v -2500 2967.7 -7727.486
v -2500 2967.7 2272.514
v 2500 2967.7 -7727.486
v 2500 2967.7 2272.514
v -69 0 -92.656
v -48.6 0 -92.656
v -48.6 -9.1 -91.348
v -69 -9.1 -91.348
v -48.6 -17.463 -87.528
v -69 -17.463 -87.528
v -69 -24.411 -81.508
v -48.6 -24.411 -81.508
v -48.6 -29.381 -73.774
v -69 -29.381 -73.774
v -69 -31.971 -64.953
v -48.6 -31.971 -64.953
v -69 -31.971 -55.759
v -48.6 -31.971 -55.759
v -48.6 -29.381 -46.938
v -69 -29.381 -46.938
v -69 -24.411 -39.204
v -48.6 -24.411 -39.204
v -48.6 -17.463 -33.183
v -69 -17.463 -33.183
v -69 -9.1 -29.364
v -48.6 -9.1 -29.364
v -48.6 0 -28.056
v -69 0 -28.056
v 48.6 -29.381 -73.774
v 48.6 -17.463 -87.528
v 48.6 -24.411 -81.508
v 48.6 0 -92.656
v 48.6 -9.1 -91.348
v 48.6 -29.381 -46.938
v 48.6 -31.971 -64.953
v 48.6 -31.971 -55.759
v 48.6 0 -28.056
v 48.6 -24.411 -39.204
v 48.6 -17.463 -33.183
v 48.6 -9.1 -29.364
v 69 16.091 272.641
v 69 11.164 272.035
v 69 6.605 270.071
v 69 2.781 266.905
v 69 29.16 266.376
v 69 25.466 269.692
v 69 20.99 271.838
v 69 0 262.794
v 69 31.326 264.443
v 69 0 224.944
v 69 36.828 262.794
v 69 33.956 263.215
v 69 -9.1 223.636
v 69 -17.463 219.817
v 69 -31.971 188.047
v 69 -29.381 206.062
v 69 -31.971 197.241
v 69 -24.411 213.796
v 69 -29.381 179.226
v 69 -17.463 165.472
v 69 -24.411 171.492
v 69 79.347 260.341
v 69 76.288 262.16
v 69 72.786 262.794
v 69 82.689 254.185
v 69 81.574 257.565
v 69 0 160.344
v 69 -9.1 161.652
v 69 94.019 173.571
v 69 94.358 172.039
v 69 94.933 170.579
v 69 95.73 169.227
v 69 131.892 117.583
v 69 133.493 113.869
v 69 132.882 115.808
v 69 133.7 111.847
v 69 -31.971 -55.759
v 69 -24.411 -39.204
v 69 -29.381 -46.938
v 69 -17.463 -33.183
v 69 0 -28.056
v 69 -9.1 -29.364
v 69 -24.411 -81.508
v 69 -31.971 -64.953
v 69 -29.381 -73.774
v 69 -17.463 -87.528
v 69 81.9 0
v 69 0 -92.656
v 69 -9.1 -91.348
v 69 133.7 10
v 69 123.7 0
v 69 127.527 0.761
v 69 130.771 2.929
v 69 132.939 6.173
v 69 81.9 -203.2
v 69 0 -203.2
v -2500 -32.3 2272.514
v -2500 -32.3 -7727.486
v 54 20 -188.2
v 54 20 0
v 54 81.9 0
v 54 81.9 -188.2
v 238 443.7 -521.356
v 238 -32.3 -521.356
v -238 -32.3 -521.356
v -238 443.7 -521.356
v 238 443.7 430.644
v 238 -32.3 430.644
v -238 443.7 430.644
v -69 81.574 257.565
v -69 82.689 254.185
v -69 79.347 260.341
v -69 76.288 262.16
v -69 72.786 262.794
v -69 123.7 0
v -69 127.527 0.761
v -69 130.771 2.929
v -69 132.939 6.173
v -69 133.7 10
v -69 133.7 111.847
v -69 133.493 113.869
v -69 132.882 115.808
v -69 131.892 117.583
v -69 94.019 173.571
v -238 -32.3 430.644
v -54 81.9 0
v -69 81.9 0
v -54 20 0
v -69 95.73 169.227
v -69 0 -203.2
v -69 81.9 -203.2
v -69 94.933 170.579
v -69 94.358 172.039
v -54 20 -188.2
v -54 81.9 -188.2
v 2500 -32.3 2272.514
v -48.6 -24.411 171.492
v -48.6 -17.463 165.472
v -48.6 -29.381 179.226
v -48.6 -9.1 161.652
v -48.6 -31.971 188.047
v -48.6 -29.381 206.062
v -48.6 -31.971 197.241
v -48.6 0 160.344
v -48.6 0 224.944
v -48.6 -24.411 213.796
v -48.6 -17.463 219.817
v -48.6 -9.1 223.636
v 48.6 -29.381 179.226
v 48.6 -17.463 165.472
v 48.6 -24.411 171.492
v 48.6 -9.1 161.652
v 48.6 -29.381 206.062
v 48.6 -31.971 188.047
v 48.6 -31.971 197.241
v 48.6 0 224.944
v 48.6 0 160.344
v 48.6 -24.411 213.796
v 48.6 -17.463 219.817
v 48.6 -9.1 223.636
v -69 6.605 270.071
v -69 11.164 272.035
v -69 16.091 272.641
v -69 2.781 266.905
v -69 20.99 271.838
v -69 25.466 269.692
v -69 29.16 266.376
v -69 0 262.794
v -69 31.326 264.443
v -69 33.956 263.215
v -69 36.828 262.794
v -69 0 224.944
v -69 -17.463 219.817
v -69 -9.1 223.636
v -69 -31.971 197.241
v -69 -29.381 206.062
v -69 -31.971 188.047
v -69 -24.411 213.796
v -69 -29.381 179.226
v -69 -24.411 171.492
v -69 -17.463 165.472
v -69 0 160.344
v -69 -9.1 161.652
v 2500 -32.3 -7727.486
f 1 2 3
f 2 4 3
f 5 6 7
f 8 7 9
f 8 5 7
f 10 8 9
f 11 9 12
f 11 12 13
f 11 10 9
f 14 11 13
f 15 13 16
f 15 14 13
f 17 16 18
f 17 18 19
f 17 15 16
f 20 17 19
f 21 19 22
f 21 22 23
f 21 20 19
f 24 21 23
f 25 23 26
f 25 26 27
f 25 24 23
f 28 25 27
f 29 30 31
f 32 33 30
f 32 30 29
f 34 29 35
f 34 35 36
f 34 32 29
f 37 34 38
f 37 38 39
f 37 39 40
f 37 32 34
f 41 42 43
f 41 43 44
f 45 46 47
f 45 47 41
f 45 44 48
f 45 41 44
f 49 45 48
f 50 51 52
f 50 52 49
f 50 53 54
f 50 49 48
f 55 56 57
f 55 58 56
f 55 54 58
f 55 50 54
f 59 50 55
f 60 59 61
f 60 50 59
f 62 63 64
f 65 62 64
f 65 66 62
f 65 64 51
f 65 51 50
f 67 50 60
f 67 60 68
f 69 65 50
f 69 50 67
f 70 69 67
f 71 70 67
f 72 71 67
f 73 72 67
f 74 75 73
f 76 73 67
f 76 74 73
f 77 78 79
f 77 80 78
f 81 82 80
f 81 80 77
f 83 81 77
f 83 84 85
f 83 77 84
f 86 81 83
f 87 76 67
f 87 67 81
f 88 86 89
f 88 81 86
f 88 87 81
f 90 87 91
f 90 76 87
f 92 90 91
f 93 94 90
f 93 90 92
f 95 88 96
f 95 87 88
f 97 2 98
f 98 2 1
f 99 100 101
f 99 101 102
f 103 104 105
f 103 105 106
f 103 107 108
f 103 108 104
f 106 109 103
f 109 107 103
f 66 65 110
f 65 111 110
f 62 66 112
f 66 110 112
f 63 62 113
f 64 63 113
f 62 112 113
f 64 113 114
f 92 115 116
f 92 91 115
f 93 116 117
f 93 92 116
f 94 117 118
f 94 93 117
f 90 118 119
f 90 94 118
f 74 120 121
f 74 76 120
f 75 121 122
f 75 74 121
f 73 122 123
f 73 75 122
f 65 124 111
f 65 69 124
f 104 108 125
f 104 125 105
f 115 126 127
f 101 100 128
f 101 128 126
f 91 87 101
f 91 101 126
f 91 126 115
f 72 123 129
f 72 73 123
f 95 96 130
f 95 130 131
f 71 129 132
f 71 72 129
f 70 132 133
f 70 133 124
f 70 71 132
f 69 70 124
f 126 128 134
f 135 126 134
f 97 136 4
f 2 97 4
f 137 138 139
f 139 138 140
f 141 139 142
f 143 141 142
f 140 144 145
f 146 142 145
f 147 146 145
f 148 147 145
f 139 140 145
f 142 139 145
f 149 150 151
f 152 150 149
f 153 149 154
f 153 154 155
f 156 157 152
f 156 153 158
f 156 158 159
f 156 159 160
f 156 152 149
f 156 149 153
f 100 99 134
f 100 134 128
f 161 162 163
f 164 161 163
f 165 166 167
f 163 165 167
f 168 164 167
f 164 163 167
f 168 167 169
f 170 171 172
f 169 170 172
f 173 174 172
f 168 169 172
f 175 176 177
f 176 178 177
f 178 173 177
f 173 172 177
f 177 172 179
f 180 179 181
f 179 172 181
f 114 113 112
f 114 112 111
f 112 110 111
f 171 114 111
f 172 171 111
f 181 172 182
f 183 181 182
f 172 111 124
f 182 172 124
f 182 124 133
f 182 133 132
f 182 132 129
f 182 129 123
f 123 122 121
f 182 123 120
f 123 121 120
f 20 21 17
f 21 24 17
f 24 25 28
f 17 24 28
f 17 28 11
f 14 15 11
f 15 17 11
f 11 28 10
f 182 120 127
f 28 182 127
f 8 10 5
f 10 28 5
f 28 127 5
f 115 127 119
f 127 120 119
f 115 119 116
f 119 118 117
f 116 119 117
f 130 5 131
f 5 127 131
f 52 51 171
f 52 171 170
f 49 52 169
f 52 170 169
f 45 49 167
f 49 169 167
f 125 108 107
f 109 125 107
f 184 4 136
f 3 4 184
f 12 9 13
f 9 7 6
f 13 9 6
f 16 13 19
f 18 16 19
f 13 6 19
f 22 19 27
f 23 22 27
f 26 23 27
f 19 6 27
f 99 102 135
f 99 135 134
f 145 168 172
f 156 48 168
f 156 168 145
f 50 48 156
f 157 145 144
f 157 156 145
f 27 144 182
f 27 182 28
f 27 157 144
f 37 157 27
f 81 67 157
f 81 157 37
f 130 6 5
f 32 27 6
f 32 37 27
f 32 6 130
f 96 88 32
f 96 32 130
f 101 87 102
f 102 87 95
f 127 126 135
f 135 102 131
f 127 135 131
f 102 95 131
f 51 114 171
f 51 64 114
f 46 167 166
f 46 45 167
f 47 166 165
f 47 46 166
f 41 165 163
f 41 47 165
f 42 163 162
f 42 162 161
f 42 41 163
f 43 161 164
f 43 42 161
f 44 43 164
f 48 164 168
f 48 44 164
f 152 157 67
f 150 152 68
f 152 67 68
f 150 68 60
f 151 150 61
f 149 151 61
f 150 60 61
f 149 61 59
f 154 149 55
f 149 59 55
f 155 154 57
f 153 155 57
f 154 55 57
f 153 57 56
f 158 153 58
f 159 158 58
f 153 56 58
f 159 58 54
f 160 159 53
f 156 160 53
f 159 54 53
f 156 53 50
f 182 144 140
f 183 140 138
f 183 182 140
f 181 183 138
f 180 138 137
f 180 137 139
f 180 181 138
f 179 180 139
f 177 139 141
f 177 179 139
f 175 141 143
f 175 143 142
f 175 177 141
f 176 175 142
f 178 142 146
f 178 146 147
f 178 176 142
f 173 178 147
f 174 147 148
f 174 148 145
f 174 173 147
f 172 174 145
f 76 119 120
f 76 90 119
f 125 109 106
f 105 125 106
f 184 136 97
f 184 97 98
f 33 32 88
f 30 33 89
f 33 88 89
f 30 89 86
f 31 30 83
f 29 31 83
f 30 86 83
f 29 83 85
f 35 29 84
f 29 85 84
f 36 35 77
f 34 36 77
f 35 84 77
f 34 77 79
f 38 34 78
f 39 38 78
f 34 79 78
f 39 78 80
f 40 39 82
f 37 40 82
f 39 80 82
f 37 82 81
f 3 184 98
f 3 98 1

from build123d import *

# Parameters (mm, degrees)
BOSS_EXTRUDE1_DEPTH = 69
SKETCH4_W           = 15
SKETCH4_H           = 188.2
BOSS_EXTRUDE2_DEPTH = 61.9
BOSS_EXTRUDE3_DEPTH = 20.4
FILLET1_R           = 10
SKETCH6_W           = 10000
SKETCH6_H           = 3000
BOSS_EXTRUDE4_DEPTH = 2500
SKETCH7_W           = 952
SKETCH7_H           = 476
BOSS_EXTRUDE5_DEPTH = 238


with BuildPart() as part:
    # Sketch2 → Boss-Extrude1 (new body, symmetric)
    with BuildSketch(Plane(origin=(0, 0, 0), x_dir=(0, 0, -1), z_dir=(1, 0, 0))):
        with BuildLine():
            Line((-262.793626597, 0), (0, 0))
            Line((0, 0), (203.2, 0))
            Line((203.2, 0), (203.2, 81.9))
            Line((203.2, 81.9), (188.2, 81.9))
            Line((188.2, 81.9), (188.2, 20))
            Line((188.2, 20), (0, 20))
            Line((0, 20), (0, 133.7))
            Line((0, 133.7), (-115, 133.7))
            Line((-115, 133.7), (-171.193830238, 94.352656466))
            Line((-171.193830238, 94.352656466), (-262.793626597, 81.479144628))
            Line((-262.793626597, 81.479144628), (-262.793626597, 31.479144628))
            ThreePointArc((-262.793626597, 31.479144628), (-272.644060375, 15.739572314), (-262.793626597, 0))
        make_face()
    extrude(amount=BOSS_EXTRUDE1_DEPTH, both=True)

    # Sketch4 → Boss-Extrude2 (add)
    with BuildSketch(Plane(origin=(0, 20, 0), x_dir=(1, 0, 0), z_dir=(0, 1, 0))):
        with Locations((61.5, 94.1)):
            Rectangle(SKETCH4_W, SKETCH4_H)
    boss_extrude2 = extrude(amount=BOSS_EXTRUDE2_DEPTH)

    # Mirror1: Boss-Extrude2 across plane
    add(boss_extrude2.mirror(Plane(origin=(0, 0, 0), x_dir=(0, 0, 1), z_dir=(1, 0, 0))))

    # Sketch5 → Boss-Extrude3 (add)
    with BuildSketch(Plane(origin=(69, 0, 0), x_dir=(0, 0, -1), z_dir=(1, 0, 0))):
        with BuildLine():
            Line((-224.944060375, 0), (-160.344060375, 0))
            ThreePointArc((-160.344060375, 0), (-192.644060375, -32.3), (-224.944060375, 0))
        make_face()
        with BuildLine():
            Line((28.055939625, 0), (92.655939625, 0))
            ThreePointArc((92.655939625, 0), (60.355939625, -32.3), (28.055939625, 0))
        make_face()
    boss_extrude3 = extrude(amount=-BOSS_EXTRUDE3_DEPTH)

    # Mirror2: Boss-Extrude3 across plane
    add(boss_extrude3.mirror(Plane(origin=(0, 0, 0), x_dir=(0, 0, 1), z_dir=(1, 0, 0))))

    # Fillet1
    fillet1_edges = [part.edges().sort_by_distance(p)[0] for p in [
        (0, 31.479144628, 262.793626597),
        (0, 81.479144628, 262.793626597),
        (0, 94.352656466, 171.193830238),
        (0, 133.7, 115),
        (0, 133.7, 0),
    ]]
    fillet(fillet1_edges, radius=FILLET1_R)


with BuildPart() as body_2:
    # Sketch6 → Boss-Extrude4 (new body, symmetric)
    with BuildSketch(Plane(origin=(0, 0, 0), x_dir=(0, 0, -1), z_dir=(1, 0, 0))):
        with Locations((2727.48649749, 1467.7)):
            Rectangle(SKETCH6_W, SKETCH6_H)
    extrude(amount=BOSS_EXTRUDE4_DEPTH, both=True)


with BuildPart() as body_3:
    # Sketch7 → Boss-Extrude5 (new body, symmetric)
    with BuildSketch(Plane(origin=(0, 0, 0), x_dir=(0, 0, -1), z_dir=(1, 0, 0))):
        with Locations((45.355939625, 205.7)):
            Rectangle(SKETCH7_W, SKETCH7_H)
    extrude(amount=BOSS_EXTRUDE5_DEPTH, both=True)


solid = Compound([part.part, body_2.part, body_3.part])
